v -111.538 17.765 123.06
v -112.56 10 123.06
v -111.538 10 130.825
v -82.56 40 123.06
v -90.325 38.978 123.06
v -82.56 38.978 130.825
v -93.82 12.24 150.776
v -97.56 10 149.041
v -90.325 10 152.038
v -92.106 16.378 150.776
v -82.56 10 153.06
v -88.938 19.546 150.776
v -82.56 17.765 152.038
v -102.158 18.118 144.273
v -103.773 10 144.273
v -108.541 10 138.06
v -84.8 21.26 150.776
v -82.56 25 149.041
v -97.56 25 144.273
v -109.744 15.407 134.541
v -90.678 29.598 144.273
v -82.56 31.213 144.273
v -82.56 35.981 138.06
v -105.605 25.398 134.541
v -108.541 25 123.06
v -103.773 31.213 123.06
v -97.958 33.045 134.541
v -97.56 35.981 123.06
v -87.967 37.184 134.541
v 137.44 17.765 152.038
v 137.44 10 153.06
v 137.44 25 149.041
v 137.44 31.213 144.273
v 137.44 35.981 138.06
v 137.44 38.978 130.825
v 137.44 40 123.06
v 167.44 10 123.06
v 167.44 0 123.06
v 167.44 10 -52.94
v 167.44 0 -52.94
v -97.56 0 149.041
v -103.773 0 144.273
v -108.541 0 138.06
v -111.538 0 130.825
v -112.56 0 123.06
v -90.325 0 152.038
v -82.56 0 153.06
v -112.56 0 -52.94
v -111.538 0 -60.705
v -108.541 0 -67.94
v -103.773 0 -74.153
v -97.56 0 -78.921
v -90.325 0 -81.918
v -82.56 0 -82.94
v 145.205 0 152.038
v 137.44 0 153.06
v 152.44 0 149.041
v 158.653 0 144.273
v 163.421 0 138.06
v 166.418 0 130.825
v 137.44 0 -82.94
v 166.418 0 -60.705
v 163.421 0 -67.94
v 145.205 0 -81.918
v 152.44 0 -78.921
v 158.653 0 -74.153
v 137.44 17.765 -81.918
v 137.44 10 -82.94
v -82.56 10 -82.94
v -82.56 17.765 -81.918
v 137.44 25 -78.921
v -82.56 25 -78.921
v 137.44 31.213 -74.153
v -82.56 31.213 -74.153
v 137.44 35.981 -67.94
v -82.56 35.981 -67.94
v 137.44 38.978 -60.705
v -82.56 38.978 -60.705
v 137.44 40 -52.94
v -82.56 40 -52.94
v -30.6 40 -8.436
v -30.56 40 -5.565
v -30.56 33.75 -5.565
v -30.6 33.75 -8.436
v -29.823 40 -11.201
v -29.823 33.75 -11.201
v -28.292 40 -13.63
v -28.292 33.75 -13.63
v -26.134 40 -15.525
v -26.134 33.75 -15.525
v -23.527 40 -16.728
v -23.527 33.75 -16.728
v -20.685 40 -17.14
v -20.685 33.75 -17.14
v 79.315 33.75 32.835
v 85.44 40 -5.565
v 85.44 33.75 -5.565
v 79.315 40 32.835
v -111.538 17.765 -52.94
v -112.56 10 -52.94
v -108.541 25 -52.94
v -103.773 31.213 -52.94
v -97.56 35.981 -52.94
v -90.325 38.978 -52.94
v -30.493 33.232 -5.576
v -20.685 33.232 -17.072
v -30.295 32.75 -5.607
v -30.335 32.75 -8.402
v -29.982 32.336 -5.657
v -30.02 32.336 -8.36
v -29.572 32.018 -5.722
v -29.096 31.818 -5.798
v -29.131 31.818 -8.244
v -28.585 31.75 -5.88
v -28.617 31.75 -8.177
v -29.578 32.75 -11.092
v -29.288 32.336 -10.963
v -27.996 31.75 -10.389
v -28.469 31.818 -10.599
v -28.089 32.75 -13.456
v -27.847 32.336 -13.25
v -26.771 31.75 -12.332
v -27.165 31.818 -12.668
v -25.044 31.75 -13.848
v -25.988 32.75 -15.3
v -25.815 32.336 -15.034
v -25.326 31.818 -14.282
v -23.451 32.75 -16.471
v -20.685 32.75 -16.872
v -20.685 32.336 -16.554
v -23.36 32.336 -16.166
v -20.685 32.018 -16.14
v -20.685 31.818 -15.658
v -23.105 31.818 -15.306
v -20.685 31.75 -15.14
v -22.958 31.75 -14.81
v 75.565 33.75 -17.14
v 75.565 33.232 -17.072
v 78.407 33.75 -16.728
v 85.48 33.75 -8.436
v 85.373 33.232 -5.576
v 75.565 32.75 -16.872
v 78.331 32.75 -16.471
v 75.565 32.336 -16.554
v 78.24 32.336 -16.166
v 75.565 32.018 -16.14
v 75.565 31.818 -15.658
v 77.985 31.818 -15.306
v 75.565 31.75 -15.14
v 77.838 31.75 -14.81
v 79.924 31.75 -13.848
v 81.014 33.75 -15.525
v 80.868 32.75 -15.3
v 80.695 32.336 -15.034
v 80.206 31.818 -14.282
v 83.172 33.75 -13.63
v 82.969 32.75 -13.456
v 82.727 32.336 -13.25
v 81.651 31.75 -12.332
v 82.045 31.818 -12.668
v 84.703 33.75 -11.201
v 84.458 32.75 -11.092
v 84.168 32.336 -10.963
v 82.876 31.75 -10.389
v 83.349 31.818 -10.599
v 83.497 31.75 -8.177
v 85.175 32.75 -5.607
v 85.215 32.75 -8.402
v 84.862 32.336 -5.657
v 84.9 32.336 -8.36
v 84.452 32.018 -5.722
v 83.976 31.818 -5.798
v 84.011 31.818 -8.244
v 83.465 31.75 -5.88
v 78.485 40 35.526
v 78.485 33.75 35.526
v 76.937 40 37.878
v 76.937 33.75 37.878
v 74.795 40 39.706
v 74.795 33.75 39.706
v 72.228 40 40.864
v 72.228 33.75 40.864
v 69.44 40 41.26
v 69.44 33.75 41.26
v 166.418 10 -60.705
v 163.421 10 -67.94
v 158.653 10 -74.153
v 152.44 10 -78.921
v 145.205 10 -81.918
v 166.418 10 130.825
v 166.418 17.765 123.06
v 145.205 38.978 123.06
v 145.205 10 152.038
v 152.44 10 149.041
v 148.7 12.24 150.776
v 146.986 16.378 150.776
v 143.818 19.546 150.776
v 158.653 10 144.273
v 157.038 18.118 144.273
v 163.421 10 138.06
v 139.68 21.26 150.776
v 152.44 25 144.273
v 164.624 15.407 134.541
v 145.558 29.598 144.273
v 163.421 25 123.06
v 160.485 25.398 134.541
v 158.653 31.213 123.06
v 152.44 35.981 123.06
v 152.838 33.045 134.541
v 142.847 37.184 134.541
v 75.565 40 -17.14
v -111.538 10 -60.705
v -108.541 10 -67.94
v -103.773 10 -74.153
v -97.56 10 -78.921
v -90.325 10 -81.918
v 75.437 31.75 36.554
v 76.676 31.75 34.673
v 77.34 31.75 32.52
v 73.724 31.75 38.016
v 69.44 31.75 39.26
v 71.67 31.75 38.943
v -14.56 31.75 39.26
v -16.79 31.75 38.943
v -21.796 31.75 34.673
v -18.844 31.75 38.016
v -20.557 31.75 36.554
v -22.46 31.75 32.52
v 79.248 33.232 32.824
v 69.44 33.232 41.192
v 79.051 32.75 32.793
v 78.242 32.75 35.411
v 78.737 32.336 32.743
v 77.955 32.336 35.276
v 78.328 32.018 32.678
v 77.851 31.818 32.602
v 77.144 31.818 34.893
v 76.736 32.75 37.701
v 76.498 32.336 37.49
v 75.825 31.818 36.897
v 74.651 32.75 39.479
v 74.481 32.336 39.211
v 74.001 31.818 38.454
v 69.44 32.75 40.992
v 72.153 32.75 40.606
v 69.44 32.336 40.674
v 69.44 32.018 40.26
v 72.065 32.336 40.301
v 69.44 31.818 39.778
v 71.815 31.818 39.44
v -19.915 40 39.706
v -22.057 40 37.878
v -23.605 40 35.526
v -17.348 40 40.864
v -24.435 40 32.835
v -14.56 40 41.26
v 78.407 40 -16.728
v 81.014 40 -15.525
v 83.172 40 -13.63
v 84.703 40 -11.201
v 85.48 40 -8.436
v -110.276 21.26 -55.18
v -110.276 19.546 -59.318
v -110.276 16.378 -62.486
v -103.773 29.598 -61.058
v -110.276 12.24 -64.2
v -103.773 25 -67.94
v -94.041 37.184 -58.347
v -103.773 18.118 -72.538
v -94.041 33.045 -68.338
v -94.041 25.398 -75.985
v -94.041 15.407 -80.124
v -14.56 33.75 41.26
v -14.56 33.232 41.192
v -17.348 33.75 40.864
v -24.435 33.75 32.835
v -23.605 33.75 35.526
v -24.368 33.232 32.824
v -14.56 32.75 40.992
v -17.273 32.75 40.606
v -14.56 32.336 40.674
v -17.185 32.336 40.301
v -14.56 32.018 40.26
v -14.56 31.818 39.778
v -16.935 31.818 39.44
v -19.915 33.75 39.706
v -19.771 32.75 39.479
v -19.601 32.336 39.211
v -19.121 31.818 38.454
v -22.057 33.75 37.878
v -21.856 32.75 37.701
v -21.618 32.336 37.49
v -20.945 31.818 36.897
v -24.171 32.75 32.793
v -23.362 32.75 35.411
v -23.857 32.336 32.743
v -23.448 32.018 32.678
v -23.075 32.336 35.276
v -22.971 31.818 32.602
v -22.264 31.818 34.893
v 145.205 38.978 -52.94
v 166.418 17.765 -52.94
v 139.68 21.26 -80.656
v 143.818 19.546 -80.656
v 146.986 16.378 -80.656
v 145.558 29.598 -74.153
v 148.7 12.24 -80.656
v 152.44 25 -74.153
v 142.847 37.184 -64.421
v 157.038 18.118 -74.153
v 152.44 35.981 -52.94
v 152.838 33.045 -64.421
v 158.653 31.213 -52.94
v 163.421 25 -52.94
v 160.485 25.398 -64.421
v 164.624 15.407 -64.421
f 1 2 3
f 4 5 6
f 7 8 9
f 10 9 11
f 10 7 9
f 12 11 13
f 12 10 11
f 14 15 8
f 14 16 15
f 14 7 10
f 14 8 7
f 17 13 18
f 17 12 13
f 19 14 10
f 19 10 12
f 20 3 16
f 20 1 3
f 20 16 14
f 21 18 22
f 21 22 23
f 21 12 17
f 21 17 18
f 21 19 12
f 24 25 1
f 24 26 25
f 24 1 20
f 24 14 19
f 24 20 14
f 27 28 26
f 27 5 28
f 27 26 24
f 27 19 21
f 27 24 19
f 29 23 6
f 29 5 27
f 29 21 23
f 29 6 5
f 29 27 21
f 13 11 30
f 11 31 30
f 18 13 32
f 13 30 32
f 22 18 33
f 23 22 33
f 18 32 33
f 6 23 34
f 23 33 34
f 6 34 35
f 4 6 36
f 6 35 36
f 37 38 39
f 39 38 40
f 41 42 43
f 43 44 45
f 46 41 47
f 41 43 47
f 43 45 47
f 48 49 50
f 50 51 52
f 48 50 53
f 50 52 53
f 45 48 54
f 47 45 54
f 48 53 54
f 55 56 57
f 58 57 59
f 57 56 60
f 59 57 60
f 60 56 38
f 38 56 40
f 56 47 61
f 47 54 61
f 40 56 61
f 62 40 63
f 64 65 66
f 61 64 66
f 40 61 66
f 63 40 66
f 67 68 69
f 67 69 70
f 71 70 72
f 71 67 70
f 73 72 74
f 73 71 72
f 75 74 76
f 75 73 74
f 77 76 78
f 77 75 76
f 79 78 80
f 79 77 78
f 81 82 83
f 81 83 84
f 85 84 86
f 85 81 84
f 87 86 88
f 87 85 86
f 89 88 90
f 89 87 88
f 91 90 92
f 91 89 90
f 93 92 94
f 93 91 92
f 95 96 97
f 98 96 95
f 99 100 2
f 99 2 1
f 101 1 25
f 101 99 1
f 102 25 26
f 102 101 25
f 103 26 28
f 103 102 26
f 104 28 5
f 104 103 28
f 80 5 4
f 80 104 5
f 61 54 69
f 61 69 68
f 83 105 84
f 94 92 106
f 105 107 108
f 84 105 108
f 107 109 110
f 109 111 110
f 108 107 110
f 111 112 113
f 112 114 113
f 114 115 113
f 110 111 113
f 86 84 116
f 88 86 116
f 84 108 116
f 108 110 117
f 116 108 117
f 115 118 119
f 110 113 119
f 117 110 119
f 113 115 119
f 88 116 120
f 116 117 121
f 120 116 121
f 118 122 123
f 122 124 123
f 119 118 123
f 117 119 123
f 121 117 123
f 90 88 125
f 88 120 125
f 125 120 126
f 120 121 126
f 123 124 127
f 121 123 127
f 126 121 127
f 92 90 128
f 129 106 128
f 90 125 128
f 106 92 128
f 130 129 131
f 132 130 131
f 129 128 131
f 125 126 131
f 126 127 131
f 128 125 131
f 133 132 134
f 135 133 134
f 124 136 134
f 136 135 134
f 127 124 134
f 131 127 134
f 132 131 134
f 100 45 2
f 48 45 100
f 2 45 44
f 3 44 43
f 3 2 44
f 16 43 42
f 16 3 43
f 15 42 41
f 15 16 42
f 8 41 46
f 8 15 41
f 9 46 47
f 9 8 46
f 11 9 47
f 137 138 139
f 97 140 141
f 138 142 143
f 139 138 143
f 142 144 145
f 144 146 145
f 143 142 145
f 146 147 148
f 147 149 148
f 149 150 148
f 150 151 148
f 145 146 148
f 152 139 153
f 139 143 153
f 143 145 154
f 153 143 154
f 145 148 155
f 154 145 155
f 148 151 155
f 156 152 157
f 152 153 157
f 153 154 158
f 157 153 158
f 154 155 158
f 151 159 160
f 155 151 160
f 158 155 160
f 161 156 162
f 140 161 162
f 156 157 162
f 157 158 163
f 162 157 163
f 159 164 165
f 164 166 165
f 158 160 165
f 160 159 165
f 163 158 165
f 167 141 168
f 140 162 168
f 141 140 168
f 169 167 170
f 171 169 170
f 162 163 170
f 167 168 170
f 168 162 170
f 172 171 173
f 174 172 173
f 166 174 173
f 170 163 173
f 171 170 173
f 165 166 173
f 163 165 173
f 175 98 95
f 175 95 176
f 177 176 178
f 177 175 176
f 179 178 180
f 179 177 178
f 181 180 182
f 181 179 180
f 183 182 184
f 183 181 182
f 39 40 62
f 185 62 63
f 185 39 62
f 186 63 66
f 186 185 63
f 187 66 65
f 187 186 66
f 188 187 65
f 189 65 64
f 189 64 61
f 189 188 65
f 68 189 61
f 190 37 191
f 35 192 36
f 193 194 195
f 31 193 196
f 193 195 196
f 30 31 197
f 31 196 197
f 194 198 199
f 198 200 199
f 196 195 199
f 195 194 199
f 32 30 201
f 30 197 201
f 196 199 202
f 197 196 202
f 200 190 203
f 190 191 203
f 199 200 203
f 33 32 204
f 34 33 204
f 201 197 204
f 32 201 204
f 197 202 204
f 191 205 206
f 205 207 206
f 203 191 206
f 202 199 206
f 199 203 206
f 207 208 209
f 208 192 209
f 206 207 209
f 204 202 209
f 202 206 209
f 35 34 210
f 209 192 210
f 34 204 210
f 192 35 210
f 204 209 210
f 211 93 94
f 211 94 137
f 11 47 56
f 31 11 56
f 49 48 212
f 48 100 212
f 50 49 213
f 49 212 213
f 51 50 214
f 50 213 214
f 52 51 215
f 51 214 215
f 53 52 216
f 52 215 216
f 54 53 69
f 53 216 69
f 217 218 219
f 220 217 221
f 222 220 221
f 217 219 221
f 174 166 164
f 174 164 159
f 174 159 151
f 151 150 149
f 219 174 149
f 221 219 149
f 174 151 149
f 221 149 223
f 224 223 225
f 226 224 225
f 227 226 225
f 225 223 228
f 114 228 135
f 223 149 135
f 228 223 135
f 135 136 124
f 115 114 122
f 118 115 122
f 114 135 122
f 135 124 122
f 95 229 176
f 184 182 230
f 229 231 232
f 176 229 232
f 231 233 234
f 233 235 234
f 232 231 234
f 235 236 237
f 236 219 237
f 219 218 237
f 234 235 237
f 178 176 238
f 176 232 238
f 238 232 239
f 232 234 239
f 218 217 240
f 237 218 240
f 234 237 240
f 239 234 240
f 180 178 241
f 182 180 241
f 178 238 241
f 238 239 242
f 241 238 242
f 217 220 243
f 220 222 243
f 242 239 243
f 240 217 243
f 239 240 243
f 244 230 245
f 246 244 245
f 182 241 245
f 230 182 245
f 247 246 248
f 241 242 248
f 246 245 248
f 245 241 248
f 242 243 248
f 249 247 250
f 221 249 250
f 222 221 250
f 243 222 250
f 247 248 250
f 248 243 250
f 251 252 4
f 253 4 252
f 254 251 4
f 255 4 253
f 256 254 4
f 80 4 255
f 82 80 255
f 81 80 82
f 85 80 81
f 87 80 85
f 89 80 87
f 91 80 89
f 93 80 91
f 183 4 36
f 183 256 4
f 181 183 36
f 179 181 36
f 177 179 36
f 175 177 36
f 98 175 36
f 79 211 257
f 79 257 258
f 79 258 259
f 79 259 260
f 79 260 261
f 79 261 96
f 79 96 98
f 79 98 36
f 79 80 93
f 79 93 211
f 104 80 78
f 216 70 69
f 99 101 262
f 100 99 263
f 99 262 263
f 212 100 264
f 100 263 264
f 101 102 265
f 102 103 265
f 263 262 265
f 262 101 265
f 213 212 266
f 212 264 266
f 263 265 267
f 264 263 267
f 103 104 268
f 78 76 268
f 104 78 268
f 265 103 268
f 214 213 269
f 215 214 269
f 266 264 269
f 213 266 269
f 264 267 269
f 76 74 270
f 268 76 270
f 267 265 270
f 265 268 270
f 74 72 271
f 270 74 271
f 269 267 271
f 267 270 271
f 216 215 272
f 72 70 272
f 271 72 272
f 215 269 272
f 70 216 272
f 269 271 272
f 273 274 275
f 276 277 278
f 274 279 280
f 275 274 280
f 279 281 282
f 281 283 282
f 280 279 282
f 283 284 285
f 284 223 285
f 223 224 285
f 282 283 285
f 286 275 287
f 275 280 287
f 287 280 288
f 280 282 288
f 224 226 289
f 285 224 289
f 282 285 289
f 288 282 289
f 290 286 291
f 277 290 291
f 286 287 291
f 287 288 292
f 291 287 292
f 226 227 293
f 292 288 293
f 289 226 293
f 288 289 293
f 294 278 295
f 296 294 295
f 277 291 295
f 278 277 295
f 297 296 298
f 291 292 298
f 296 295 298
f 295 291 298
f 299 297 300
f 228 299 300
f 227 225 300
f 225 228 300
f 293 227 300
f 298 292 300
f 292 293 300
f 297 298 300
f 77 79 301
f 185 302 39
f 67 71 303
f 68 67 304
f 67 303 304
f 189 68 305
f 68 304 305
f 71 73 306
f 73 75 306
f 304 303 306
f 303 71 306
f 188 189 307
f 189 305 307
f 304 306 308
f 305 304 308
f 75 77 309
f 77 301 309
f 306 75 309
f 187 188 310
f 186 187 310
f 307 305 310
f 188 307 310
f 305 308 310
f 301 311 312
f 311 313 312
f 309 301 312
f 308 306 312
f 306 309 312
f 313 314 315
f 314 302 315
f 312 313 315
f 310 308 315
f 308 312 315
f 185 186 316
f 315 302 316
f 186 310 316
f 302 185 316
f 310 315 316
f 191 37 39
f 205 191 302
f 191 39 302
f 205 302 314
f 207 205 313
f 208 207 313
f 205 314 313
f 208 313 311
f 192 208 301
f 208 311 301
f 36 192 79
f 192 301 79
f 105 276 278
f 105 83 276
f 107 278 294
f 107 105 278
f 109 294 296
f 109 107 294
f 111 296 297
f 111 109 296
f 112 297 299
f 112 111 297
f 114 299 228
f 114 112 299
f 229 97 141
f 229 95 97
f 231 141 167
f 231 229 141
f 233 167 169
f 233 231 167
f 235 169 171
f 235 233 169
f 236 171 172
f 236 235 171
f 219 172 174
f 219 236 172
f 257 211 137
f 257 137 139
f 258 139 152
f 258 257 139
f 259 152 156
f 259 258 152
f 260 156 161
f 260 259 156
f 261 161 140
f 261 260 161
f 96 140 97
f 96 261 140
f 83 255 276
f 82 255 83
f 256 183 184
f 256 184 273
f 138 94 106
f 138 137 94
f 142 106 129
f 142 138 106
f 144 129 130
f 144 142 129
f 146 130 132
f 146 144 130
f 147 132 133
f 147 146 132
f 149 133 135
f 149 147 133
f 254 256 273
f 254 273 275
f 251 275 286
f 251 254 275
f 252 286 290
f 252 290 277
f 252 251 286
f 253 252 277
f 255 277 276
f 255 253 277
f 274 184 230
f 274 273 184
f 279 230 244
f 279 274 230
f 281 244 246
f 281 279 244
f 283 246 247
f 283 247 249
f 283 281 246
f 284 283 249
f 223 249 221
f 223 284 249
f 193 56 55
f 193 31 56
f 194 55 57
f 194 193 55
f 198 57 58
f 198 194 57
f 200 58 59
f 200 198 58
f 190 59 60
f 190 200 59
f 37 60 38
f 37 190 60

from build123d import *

# Parameters (mm, degrees)
SKETCH1_W           = 280
SKETCH1_H           = 236
BOSS_EXTRUDE1_DEPTH = 40
FILLET1_R           = 30
CUT_EXTRUDE2_DEPTH  = 8.25
FILLET2_R           = 2


with BuildPart() as part:
    # Sketch1 → Boss-Extrude1 (new body)
    with BuildSketch(Plane(origin=(0, 0, 0), x_dir=(1, 0, 0), z_dir=(0, 1, 0))):
        with Locations((27.44, -35.06)):
            Rectangle(SKETCH1_W, SKETCH1_H)
    extrude(amount=BOSS_EXTRUDE1_DEPTH)

    # Fillet1
    fillet1_edges = [part.edges().sort_by_distance(p)[0] for p in [
        (167.44, 40, 35.06),
        (27.44, 40, -82.94),
        (-112.56, 40, 35.06),
        (-112.56, 20, -82.94),
        (167.44, 20, -82.94),
        (167.44, 20, 153.06),
        (-112.56, 20, 153.06),
        (27.44, 40, 153.06),
    ]]
    fillet(fillet1_edges, radius=FILLET1_R)

    # Sketch3 → Cut-Extrude2 (cut)
    with BuildSketch(Plane(origin=(0, 40, 0), x_dir=(1, 0, 0), z_dir=(0, 1, 0))):
        with BuildLine():
            Line((-20.684825583, 17.14), (75.564825583, 17.14))
            ThreePointArc((75.564825583, 17.14), (83.172419453, 13.630340169), (85.44, 5.564903101))
            Line((85.44, 5.564903101), (79.315174417, -32.835096899))
            ThreePointArc((79.315174417, -32.835096899), (75.930340169, -38.86759387), (69.44, -41.26))
            Line((69.44, -41.26), (-14.56, -41.26))
            ThreePointArc((-14.56, -41.26), (-21.050340169, -38.86759387), (-24.435174417, -32.835096899))
            Line((-24.435174417, -32.835096899), (-30.56, 5.564903101))
            ThreePointArc((-30.56, 5.564903101), (-28.292419453, 13.630340169), (-20.684825583, 17.14))
        make_face()
    extrude(amount=-CUT_EXTRUDE2_DEPTH, mode=Mode.SUBTRACT)

    # Fillet2
    fillet2_edges = [part.edges().sort_by_distance(p)[0] for p in [
        (-21.050340169, 31.75, 38.86759387),
        (-27.497587208, 31.75, 13.635096899),
        (-28.292419453, 31.75, -13.630340169),
        (27.44, 31.75, -17.14),
        (83.172419453, 31.75, -13.630340169),
        (82.377587208, 31.75, 13.635096899),
        (75.930340169, 31.75, 38.86759387),
        (27.44, 31.75, 41.26),
    ]]
    fillet(fillet2_edges, radius=FILLET2_R)


solid = part.part
